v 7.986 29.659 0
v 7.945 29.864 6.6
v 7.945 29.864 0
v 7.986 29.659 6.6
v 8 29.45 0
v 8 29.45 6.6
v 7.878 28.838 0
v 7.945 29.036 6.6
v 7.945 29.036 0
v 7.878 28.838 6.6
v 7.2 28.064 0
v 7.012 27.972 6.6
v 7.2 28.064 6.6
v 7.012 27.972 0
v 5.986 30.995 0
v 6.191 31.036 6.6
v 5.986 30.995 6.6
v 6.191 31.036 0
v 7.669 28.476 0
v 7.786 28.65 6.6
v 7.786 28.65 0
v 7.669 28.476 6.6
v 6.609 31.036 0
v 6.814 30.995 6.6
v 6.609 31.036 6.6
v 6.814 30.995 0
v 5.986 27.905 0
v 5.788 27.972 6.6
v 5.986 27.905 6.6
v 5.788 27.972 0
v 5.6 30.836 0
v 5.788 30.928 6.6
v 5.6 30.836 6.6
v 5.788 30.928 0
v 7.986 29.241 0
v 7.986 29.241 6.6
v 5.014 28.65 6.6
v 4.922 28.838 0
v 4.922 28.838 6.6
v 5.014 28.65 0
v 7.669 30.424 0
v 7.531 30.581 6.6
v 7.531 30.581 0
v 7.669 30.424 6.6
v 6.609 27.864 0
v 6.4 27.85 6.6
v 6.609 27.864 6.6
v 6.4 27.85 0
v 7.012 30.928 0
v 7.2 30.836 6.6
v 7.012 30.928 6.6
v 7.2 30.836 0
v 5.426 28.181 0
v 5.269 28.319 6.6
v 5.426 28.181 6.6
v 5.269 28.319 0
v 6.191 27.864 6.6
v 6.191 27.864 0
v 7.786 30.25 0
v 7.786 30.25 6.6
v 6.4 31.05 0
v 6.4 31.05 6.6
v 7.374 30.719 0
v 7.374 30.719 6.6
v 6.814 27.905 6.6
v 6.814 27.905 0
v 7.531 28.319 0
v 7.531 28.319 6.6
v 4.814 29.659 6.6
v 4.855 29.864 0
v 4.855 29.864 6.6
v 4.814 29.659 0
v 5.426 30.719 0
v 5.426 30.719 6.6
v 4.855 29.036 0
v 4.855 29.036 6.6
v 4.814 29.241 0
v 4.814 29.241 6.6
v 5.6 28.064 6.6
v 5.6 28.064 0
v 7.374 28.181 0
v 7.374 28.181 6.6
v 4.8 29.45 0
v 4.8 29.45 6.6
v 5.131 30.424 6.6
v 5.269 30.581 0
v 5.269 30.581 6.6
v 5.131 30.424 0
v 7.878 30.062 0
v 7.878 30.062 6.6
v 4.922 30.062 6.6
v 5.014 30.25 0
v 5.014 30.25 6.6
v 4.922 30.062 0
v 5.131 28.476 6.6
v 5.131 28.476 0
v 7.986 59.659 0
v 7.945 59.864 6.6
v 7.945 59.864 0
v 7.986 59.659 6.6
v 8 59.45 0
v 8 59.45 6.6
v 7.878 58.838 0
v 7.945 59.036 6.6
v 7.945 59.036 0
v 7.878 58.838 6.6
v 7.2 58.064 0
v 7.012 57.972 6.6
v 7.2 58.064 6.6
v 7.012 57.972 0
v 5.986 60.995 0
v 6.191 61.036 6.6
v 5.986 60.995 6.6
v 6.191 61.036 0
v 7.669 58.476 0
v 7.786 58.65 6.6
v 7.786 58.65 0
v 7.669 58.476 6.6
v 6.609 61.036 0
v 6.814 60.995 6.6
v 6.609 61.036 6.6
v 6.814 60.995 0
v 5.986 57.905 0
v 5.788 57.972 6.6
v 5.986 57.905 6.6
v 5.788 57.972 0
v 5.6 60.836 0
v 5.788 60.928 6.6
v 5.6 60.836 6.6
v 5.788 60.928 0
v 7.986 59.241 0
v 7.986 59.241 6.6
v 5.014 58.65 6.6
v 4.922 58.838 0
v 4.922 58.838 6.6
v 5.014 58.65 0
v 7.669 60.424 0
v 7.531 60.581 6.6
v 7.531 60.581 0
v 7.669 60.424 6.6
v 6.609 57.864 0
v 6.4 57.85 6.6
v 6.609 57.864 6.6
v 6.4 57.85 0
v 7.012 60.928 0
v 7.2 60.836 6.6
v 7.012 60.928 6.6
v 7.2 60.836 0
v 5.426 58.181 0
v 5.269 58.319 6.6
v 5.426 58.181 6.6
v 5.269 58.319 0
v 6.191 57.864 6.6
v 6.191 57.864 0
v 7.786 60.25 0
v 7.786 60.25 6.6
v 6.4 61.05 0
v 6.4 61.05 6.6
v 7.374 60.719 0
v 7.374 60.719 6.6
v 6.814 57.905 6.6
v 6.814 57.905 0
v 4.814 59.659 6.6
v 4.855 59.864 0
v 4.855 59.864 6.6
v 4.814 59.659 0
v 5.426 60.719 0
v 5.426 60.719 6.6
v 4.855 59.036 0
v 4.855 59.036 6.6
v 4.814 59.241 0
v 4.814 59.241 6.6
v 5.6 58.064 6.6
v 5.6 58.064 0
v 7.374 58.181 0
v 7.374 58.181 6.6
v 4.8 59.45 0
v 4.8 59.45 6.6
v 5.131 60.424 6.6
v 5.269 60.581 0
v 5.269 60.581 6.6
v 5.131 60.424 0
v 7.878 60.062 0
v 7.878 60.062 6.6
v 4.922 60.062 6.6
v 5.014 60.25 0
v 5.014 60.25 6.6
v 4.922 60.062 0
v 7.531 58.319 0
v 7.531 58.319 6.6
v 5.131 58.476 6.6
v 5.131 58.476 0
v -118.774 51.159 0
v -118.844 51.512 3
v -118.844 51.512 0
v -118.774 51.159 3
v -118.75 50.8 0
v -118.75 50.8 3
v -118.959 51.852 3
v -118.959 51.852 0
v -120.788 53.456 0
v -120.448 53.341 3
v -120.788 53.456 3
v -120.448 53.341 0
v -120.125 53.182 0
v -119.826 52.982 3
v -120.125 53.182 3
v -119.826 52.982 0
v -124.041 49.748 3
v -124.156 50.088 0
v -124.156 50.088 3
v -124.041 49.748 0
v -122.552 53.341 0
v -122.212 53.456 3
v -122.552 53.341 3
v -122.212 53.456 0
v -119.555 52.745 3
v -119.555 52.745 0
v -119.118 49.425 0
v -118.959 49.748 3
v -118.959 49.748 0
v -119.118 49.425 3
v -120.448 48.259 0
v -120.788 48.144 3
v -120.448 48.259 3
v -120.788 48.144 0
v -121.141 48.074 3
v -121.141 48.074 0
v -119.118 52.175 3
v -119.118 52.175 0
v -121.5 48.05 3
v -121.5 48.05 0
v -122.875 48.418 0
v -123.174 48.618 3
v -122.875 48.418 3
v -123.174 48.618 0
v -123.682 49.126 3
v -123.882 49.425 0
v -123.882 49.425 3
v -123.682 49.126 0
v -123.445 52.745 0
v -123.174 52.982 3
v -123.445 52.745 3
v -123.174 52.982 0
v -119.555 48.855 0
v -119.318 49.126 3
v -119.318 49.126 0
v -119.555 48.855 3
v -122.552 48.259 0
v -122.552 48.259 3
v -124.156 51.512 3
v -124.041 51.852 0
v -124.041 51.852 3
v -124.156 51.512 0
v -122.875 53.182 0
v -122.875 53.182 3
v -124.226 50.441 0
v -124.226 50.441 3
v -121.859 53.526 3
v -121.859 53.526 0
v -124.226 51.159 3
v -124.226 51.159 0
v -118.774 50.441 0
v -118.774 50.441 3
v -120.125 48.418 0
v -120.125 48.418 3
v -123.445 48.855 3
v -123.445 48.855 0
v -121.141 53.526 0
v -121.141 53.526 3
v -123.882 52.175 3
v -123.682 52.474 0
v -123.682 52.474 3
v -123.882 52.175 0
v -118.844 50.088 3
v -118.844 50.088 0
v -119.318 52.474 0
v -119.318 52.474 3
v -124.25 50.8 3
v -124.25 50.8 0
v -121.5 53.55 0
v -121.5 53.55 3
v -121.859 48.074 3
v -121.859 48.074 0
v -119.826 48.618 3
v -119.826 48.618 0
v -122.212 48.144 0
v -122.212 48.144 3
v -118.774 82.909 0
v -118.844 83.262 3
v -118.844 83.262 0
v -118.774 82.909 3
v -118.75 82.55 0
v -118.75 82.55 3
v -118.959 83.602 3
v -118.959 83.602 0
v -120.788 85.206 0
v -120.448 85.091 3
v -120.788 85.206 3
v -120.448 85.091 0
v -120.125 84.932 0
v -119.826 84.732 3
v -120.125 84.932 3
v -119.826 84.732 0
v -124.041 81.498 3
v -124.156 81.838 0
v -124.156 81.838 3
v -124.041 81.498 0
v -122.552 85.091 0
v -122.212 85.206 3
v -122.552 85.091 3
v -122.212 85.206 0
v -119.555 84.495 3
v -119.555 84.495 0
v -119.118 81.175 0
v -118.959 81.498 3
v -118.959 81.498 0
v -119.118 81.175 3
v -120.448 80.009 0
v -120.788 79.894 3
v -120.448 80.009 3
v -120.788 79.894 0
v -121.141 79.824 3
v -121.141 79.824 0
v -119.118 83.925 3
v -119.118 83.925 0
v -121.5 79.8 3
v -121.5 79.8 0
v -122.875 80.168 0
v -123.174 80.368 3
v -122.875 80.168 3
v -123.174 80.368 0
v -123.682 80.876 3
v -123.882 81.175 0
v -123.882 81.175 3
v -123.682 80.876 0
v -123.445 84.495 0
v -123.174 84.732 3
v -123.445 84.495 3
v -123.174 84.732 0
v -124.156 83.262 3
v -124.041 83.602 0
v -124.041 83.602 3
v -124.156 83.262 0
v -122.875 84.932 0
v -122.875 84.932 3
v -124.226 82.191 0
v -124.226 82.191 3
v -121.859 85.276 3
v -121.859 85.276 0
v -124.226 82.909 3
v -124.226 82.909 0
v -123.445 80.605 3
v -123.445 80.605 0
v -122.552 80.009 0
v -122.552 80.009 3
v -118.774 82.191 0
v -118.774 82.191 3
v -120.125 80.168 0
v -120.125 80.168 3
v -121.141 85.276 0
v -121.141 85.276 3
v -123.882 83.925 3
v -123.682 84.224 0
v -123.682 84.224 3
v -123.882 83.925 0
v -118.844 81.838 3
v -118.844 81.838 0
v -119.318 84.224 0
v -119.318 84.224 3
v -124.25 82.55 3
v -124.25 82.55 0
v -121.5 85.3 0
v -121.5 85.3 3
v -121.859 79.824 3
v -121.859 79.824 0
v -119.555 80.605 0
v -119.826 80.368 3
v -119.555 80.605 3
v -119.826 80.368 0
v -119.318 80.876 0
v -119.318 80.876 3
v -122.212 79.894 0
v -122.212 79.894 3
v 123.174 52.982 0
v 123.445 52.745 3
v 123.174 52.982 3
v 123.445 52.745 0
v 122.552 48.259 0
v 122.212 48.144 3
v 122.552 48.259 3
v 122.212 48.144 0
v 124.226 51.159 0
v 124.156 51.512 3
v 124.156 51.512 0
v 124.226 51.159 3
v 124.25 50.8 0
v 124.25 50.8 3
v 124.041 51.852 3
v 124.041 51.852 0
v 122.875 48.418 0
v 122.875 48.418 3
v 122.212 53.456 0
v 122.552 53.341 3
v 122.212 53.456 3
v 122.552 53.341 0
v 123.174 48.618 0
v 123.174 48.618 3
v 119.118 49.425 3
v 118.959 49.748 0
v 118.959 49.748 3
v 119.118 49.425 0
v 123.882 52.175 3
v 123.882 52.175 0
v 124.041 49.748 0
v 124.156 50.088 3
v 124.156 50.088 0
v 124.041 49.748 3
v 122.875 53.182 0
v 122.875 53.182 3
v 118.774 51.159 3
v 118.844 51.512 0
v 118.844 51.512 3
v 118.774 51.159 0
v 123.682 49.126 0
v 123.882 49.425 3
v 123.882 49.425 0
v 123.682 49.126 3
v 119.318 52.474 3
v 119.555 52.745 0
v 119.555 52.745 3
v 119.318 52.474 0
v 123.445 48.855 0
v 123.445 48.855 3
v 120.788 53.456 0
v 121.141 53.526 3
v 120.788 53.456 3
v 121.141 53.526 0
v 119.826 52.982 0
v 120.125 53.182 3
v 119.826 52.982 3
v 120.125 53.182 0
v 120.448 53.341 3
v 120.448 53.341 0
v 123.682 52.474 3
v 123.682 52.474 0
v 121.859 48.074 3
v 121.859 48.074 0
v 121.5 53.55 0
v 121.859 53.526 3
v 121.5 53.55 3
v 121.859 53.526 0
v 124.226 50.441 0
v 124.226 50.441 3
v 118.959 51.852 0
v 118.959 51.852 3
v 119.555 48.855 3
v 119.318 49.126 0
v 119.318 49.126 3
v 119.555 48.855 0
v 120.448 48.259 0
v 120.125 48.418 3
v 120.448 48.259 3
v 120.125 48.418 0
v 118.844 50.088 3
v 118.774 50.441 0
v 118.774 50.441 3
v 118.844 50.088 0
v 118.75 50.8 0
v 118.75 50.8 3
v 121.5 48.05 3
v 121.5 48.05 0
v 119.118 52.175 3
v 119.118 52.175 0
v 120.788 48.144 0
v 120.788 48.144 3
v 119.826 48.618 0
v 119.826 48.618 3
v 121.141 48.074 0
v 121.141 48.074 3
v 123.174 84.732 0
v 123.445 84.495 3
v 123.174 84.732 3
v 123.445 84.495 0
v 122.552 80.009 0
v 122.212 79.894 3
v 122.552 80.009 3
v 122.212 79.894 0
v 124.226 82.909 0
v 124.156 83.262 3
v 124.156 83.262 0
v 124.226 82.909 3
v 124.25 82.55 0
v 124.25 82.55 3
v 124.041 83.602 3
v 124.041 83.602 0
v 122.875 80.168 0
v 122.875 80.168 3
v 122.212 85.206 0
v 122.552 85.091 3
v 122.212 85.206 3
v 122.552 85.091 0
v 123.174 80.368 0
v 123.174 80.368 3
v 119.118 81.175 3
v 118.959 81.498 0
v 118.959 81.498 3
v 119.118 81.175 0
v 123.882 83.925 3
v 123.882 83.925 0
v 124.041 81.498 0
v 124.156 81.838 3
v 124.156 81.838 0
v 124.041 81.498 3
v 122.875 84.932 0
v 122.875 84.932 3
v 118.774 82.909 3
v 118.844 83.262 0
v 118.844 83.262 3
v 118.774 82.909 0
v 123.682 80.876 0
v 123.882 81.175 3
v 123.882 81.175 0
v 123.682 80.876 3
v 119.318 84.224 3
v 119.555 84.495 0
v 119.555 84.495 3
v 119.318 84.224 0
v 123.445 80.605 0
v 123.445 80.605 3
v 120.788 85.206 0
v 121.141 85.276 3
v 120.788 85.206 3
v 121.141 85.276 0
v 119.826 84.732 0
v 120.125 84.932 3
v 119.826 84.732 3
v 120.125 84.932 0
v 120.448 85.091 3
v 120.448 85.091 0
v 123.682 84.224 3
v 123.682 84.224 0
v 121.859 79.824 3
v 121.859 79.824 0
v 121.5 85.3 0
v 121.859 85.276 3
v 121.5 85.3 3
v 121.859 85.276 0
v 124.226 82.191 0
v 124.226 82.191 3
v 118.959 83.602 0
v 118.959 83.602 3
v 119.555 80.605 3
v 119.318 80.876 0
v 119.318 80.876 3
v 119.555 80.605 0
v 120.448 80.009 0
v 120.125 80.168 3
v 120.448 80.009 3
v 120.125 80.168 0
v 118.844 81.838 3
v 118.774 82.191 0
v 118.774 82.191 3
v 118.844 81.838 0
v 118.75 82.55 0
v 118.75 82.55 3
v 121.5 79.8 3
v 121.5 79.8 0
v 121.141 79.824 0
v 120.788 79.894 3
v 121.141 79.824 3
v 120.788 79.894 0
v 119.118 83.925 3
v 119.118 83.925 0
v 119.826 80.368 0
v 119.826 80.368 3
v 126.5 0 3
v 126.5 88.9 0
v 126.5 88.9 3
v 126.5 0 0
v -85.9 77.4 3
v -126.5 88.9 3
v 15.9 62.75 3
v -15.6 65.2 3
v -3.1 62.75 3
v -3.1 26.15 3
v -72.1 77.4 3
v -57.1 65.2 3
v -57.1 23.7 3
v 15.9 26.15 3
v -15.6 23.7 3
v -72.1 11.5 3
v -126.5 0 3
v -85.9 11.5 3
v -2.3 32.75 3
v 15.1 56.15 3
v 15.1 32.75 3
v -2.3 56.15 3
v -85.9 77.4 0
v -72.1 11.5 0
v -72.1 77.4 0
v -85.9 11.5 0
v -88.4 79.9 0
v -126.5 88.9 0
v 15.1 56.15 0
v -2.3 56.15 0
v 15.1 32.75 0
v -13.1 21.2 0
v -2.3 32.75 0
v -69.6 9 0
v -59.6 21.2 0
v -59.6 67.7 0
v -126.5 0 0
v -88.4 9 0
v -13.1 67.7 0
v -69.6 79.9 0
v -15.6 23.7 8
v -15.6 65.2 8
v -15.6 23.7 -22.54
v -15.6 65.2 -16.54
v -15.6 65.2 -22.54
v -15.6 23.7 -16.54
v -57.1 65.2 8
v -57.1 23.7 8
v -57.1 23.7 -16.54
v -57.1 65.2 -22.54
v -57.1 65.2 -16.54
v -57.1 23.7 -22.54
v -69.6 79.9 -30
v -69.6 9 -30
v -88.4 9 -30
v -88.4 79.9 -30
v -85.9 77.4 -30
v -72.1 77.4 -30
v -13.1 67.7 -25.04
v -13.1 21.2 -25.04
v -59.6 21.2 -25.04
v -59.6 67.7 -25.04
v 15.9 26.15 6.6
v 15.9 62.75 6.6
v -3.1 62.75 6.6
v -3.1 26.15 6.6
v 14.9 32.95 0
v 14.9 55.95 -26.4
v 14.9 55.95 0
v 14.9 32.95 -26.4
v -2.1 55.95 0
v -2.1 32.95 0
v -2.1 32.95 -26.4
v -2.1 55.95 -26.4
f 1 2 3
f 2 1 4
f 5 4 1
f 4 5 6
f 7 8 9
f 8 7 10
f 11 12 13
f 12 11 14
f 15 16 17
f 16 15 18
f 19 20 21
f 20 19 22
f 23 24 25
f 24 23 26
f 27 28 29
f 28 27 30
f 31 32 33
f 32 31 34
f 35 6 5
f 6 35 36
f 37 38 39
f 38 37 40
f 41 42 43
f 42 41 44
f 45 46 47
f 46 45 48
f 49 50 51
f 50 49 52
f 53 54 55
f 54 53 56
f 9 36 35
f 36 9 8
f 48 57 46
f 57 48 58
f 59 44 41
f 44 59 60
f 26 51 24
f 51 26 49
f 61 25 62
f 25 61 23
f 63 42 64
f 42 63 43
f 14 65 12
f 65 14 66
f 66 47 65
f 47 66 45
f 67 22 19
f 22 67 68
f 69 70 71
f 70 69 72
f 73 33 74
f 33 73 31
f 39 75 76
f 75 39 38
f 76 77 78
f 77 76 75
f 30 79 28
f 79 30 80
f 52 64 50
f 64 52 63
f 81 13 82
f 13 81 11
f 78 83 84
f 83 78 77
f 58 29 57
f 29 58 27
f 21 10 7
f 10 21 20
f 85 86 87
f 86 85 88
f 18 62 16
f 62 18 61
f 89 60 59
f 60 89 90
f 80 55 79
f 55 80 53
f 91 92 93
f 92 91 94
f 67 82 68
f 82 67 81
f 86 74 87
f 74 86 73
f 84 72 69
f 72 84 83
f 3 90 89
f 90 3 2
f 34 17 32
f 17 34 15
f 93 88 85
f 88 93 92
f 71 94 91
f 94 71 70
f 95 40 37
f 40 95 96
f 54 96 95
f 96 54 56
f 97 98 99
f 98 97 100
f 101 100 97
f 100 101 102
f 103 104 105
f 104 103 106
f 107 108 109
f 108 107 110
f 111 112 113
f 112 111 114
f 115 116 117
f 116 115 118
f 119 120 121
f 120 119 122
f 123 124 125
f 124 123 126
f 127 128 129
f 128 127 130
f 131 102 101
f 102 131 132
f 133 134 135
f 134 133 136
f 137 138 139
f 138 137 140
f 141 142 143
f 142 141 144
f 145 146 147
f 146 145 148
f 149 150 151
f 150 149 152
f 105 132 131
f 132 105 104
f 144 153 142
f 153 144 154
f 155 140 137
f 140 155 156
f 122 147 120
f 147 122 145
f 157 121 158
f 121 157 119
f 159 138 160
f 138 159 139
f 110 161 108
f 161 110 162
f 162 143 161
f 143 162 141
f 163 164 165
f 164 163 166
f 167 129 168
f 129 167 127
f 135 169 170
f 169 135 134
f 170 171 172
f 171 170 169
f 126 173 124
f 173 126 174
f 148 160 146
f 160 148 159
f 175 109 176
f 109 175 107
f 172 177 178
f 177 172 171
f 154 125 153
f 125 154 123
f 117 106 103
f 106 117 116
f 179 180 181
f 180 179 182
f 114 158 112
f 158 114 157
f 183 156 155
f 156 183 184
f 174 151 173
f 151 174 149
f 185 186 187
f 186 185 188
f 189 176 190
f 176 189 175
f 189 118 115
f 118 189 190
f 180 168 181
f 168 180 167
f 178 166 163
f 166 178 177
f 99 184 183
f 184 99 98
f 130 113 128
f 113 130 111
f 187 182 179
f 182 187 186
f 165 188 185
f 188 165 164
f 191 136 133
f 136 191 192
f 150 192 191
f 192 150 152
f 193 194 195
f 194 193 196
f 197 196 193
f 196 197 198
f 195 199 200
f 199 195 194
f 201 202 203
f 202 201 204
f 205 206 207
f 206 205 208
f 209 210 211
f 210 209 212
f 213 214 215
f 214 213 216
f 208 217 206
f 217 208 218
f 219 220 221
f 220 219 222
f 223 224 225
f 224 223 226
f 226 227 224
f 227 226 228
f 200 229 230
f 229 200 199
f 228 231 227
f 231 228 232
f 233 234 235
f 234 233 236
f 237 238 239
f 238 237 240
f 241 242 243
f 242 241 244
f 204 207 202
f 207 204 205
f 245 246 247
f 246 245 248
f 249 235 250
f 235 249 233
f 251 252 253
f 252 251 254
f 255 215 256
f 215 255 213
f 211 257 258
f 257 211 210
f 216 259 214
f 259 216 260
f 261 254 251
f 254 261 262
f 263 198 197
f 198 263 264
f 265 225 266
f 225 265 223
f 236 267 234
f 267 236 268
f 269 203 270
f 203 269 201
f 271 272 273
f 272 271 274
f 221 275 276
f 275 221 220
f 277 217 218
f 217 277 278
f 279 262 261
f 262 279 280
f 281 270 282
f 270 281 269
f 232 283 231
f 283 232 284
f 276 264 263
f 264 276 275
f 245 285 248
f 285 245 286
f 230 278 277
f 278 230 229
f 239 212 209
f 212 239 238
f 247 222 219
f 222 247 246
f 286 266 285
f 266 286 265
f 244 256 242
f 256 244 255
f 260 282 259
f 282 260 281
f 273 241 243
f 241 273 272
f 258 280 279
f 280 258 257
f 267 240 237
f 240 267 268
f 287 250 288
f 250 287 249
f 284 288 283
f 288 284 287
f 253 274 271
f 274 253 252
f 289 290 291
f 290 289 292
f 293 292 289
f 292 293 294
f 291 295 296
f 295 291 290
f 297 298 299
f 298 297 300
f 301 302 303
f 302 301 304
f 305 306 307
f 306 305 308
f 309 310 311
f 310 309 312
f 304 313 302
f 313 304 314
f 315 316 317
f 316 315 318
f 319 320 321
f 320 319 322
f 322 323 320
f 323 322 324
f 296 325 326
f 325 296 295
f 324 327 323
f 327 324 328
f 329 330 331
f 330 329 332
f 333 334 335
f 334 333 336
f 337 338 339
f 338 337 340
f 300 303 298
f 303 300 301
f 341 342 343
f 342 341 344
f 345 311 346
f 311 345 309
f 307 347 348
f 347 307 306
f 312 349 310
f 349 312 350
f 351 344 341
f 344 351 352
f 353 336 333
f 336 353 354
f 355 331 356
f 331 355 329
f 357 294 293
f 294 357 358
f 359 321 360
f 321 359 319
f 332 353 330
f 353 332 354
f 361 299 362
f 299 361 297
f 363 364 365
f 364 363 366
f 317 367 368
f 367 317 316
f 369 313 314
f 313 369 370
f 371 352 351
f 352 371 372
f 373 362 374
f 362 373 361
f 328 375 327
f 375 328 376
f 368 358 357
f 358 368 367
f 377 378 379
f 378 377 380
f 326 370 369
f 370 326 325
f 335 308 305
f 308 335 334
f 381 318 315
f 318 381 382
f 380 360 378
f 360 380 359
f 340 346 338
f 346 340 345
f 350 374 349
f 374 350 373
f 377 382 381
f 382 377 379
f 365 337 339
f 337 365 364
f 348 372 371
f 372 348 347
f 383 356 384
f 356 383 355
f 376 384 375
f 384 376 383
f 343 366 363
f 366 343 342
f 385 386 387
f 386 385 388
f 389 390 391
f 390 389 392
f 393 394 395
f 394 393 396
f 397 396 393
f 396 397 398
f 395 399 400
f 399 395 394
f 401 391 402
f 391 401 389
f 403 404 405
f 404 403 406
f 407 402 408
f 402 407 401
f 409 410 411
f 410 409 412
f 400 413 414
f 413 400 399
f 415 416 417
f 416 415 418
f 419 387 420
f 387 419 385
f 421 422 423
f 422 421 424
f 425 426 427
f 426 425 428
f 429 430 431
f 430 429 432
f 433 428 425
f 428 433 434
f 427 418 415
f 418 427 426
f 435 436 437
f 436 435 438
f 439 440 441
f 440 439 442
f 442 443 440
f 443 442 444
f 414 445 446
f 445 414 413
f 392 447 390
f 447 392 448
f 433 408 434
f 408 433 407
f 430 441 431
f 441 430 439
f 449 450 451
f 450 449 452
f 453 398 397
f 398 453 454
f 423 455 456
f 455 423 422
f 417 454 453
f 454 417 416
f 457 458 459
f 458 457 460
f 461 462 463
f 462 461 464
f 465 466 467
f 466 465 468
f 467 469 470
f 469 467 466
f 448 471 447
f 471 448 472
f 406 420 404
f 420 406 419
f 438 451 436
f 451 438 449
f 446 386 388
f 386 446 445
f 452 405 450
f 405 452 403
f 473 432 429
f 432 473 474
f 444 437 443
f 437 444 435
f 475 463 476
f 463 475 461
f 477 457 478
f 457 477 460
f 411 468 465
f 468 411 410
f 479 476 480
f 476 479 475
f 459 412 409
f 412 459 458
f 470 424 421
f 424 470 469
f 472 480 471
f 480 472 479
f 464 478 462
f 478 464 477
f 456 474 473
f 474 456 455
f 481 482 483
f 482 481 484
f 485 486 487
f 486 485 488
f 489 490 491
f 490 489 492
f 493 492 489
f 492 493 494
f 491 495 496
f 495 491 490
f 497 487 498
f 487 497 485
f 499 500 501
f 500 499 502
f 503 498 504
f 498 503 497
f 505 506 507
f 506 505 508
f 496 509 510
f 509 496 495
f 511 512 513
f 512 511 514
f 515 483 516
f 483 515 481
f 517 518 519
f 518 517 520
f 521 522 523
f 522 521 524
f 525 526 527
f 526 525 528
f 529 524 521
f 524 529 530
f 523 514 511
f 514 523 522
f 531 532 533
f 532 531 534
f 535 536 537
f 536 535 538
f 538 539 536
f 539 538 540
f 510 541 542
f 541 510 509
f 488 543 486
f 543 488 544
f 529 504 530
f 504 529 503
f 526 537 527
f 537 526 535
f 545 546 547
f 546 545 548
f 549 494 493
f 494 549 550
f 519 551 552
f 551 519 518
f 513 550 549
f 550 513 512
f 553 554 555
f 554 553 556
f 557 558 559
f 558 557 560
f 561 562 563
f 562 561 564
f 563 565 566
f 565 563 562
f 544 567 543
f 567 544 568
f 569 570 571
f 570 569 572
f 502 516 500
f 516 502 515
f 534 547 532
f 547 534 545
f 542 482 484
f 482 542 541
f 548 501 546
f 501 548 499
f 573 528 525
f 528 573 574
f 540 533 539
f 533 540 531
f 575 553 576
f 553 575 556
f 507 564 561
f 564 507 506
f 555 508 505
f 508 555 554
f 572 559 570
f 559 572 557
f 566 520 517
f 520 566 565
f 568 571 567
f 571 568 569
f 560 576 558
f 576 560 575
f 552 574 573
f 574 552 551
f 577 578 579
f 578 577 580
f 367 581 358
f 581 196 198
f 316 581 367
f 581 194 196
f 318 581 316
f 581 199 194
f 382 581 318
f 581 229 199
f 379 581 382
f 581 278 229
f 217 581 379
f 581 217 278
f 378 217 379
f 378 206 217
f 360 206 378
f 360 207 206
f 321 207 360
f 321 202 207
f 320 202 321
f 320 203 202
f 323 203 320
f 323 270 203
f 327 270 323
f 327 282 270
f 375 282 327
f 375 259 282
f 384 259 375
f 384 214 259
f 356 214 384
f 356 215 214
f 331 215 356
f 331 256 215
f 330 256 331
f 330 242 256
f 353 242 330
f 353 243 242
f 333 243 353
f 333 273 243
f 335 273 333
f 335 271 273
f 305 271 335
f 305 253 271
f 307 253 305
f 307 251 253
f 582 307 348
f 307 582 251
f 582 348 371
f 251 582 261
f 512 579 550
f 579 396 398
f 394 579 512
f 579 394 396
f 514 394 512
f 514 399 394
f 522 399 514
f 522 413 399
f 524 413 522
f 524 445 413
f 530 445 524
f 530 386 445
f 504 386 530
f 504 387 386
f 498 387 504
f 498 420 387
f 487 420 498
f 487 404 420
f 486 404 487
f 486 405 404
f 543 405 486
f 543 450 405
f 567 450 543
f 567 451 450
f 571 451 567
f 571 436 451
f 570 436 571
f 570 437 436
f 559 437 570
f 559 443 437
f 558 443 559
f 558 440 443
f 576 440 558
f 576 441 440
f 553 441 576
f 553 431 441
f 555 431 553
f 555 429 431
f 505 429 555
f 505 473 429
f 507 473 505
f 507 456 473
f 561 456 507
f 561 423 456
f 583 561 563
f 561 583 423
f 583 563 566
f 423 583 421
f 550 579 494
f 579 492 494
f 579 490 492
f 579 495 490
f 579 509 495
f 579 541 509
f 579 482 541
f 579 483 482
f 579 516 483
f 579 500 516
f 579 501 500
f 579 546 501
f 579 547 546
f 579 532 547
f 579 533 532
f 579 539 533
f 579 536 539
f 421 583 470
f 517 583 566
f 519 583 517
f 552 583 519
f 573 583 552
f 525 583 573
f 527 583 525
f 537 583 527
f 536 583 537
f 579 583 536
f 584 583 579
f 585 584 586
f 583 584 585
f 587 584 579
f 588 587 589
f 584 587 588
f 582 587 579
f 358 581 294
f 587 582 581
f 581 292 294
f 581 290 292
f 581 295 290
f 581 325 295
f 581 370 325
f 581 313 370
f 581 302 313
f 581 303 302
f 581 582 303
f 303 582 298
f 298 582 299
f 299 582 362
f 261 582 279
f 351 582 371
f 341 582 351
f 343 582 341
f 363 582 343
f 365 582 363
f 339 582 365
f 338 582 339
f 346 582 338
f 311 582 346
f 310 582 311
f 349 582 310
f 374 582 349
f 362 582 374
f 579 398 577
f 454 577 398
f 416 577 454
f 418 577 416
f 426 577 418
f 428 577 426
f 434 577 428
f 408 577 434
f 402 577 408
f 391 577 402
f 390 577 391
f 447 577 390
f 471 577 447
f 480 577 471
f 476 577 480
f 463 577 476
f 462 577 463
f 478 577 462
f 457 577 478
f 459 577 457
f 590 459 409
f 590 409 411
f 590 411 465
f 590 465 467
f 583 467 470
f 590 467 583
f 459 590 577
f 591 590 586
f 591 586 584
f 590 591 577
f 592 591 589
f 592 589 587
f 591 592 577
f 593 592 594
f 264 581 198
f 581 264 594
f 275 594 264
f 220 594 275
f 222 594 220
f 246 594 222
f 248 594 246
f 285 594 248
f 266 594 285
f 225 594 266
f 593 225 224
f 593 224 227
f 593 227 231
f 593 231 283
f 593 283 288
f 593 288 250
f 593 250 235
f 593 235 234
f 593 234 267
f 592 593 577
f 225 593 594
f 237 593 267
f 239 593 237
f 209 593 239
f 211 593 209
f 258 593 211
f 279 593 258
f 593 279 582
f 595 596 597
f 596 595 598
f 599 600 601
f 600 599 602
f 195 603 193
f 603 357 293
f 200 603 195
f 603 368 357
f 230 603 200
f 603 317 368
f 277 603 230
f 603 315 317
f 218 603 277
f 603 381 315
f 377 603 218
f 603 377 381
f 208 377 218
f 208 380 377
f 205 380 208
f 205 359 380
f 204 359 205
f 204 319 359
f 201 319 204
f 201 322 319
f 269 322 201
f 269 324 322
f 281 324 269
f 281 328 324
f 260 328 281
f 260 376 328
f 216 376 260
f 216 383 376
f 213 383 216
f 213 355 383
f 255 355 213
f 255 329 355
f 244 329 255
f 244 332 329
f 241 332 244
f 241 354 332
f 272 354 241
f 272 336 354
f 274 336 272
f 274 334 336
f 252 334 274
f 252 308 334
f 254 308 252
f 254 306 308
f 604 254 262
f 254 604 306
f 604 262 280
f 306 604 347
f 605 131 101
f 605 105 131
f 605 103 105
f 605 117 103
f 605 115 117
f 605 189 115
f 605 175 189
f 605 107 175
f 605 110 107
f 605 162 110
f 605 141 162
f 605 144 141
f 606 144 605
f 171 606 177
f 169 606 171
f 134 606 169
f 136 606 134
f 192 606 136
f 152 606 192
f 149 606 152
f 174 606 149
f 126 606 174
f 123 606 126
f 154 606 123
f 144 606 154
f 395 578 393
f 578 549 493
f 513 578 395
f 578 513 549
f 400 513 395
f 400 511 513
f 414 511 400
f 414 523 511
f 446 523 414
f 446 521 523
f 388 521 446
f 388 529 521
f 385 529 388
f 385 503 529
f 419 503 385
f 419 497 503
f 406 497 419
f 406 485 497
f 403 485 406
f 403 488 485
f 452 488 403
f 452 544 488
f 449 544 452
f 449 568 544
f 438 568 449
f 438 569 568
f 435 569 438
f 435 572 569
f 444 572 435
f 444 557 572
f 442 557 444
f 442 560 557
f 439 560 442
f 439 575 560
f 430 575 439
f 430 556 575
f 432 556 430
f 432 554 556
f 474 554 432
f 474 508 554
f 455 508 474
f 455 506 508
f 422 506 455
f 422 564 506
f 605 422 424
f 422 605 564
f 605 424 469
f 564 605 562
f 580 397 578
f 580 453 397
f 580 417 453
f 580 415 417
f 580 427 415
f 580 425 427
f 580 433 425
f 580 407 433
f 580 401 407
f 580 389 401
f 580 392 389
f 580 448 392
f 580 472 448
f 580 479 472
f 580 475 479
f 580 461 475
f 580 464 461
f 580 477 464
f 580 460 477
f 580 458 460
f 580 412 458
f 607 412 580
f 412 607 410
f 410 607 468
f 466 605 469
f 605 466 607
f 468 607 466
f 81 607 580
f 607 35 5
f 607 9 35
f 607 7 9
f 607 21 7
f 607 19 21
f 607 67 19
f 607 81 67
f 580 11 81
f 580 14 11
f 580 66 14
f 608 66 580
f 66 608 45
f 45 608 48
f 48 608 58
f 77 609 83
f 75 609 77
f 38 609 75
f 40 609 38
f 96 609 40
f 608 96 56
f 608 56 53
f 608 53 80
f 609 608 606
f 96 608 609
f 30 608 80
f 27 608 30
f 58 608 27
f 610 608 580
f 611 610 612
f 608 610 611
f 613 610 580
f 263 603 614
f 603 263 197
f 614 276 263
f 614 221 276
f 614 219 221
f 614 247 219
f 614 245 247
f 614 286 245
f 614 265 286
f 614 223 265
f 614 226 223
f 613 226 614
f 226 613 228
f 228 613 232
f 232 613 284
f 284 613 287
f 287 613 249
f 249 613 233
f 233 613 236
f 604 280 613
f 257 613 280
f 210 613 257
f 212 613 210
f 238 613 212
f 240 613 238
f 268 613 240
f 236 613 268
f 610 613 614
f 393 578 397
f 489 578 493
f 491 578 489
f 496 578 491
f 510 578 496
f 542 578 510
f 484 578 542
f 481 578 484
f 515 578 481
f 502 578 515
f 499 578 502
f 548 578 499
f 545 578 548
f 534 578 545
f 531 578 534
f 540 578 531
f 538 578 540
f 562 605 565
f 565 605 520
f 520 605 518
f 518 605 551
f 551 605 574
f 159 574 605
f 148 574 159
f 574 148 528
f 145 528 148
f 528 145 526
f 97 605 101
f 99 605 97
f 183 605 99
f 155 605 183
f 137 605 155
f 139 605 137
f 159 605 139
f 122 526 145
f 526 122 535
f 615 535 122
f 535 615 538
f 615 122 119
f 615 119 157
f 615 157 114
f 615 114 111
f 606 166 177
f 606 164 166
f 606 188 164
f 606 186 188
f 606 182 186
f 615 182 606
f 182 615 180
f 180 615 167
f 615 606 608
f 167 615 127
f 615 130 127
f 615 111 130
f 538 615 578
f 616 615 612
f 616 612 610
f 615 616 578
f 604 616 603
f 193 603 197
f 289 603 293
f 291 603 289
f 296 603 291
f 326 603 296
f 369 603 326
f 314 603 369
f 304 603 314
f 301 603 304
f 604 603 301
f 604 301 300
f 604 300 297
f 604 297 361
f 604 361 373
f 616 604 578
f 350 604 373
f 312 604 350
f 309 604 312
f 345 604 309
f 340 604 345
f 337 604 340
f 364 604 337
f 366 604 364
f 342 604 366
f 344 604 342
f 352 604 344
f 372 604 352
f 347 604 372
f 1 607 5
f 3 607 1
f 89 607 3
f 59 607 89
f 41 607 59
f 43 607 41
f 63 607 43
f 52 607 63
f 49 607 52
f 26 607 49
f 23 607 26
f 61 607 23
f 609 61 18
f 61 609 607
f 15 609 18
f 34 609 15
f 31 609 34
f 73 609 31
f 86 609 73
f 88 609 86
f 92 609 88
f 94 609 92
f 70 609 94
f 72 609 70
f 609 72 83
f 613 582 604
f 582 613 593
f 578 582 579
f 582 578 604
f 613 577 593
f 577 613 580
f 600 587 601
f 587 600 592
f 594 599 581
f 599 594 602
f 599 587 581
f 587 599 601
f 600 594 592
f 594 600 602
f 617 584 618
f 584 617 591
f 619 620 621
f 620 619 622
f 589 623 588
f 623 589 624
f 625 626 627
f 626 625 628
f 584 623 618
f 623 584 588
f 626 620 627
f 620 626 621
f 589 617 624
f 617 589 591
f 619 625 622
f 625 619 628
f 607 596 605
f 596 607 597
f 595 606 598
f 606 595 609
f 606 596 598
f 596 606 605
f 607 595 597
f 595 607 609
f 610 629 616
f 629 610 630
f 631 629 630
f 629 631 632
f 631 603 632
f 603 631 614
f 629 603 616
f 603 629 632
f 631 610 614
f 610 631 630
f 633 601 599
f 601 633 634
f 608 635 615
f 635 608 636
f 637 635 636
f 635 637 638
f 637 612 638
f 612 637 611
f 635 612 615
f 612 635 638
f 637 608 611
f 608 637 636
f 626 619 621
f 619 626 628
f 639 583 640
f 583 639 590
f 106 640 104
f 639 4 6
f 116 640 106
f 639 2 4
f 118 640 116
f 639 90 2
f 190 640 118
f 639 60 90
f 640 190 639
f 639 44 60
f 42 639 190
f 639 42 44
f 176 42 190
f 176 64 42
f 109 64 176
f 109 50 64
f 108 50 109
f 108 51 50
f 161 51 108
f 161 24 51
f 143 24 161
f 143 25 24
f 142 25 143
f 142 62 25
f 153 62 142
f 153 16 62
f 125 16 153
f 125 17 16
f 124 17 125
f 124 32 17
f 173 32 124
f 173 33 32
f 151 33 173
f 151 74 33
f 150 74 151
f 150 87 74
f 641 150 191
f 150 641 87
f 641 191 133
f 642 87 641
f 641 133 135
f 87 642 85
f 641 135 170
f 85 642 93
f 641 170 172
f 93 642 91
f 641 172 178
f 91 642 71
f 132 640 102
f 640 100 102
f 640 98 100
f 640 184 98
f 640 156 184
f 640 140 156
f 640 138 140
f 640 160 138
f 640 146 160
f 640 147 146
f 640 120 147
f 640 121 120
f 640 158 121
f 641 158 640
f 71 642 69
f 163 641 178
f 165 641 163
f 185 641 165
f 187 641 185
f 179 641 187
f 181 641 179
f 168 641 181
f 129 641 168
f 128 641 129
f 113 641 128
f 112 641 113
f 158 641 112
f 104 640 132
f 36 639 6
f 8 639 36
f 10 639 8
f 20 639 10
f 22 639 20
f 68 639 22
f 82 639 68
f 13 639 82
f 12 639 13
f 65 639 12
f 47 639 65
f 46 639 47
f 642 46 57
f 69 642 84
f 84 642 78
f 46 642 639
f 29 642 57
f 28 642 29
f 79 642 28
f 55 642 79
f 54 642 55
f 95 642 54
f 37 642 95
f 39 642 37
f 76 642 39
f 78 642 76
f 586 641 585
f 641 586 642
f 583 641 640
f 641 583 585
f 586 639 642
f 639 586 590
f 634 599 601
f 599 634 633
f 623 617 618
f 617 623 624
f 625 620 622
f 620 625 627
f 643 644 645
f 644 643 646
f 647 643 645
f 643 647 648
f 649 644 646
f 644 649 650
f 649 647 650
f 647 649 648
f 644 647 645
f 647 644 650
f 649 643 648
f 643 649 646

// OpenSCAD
// =============================================================================
// CONSOLE10 — Aux Faceplate  v0.1  (2U: CF reader + SD holder + USB-C)
//
// Regular 2U flat 3 mm faceplate that bolts to the cheek SLANT inserts.
// Hosts three devices left-to-right: CF reader, SD-card holder, USB-C panel
// mount.
//
// Split off from the 3U LCD-hole faceplate on 2026-05-30. See
// `Console10_interface_specs.md` for the canonical device dimensions.
// =============================================================================

// ---------- module geometry the plate must mate to ----------
panel_width   = 253;
cheek_thick   = 10;
slant_angle   = 30;
U             = 44.45;
interior_half = panel_width/2 - cheek_thick;   // 116.5
cheek_ctr_x   = interior_half + cheek_thick/2; // 121.5

// ---------- flat plate ----------
n_u      = 2;             // 2U faceplate
plate_w  = 253;
plate_h  = n_u * U;       // 88.9
plate_t  = 3;

// ---------- CF reader (press-fit, full-depth open sleeve) ----------
cf_w         = 13.8;
cf_h         = 65.9;
cf_d         = 30;
cf_press_clr = 0;
cf_wall_t    = 2.5;
cf_cx        = -79;
cf_cy        = plate_h/2;

// ---------- SD card holder (press-fit, closed-back sleeve, sits proud) ----
holder_w         = 41.5;
holder_h         = 41.5;
holder_d         = 24.54;
holder_press_clr = 0;
holder_wall_t    = 2.5;
holder_proud     = 5;
holder_sleeve_extra_d = 6;
holder_sleeve_d  = (holder_d - plate_t - holder_proud) + holder_wall_t + holder_sleeve_extra_d;

// ---------- USB-C panel mount (QIANRENON rectangular, screw-mounted, proud) ----
usbc_body_w         = 17;
usbc_body_h         = 23;
usbc_body_d         = 26.4;
usbc_flange_w       = 19;
usbc_flange_h       = 36.6;
usbc_flange_t       = 3.6;
usbc_screw_d        = 3.2;
usbc_screw_y_pitch  = 30;
usbc_body_clr       = 0.2;

// ---------- horizontal layout ----------
panel_layout_gap = 10;
holder_cx = cf_cx + (cf_w - 2*cf_press_clr)/2 + cf_wall_t + panel_layout_gap
                  + (holder_w - 2*holder_press_clr)/2 + holder_wall_t;
holder_cy = plate_h/2;

usbc_cx = holder_cx + (holder_w - 2*holder_press_clr)/2 + holder_wall_t
                    + panel_layout_gap + usbc_flange_w/2;
usbc_cy = plate_h/2;

// ---------- slant-insert mount holes ----------
// 2U plate: only U0-row cheek holes fit (50.80, 66.675, 82.55).
// Wide pair = 50.80 + 82.55 → 31.75 mm vertical grip.
mount_y      = [50.80, 82.55];
m10_32_clear = 5.5;

show_on_slant = false;
show_devices  = true;
floor_t       = 6;

$fn = 48;

echo(str("AUX FACEPLATE v0.1 (2U: CF + holder + USB-C) ", plate_w, " x ", plate_h, " (", n_u, "U) t", plate_t,
         " | CF @ x=", cf_cx,
         " | HOLDER @ x=", holder_cx, " sleeve d=", holder_sleeve_d, " proud ", holder_proud,
         " | USB-C @ x=", usbc_cx, " (cutout ", usbc_body_w + 2*usbc_body_clr, "x", usbc_body_h + 2*usbc_body_clr,
         ", screws Φ", usbc_screw_d, " @ y±", usbc_screw_y_pitch/2, ")"));

// =============================================================================
// CF SUPPORT SLEEVE — open both ends, wraps the CF reader full depth.
// =============================================================================
module cf_support_sleeve() {
    inner_w  = cf_w - 2*cf_press_clr;
    inner_h  = cf_h - 2*cf_press_clr;
    outer_w  = inner_w + 2*cf_wall_t;
    outer_h  = inner_h + 2*cf_wall_t;
    translate([cf_cx, cf_cy, -cf_d/2])
        difference() {
            cube([outer_w, outer_h, cf_d],     center = true);
            cube([inner_w, inner_h, cf_d + 2], center = true);
        }
}

// =============================================================================
// HOLDER SUPPORT SLEEVE — closed back (floor is the bottom-out stop).
// =============================================================================
module holder_support_sleeve() {
    inner_w   = holder_w - 2*holder_press_clr;
    inner_h   = holder_h - 2*holder_press_clr;
    outer_w   = inner_w + 2*holder_wall_t;
    outer_h   = inner_h + 2*holder_wall_t;
    cavity_d  = holder_sleeve_d - holder_wall_t;

    difference() {
        translate([holder_cx - outer_w/2, holder_cy - outer_h/2, -holder_sleeve_d])
            cube([outer_w, outer_h, holder_sleeve_d]);
        translate([holder_cx - inner_w/2, holder_cy - inner_h/2, -cavity_d])
            cube([inner_w, inner_h, cavity_d + 1]);
    }
}

// =============================================================================
// PANEL — flat 2U 3 mm slab + cutouts + rear sleeves.
// =============================================================================
module panel() {
    union() {
        difference() {
            translate([-plate_w/2, 0, 0]) cube([plate_w, plate_h, plate_t]);

            // CF reader press-fit cutout
            translate([cf_cx, cf_cy, plate_t/2])
                cube([cf_w - 2*cf_press_clr, cf_h - 2*cf_press_clr, plate_t + 2], center = true);

            // SD card holder press-fit cutout
            translate([holder_cx, holder_cy, plate_t/2])
                cube([holder_w - 2*holder_press_clr, holder_h - 2*holder_press_clr, plate_t + 2], center = true);

            // USB-C panel-mount: body cutout + 2 M3 screw holes
            translate([usbc_cx, usbc_cy, plate_t/2])
                cube([usbc_body_w + 2*usbc_body_clr, usbc_body_h + 2*usbc_body_clr, plate_t + 2], center = true);
            for (dy = [-1, 1])
                translate([usbc_cx, usbc_cy + dy*usbc_screw_y_pitch/2, -1])
                    cylinder(d = usbc_screw_d, h = plate_t + 2);

            // Slant-insert mount screws — 2 per side
            for (sx = [-cheek_ctr_x, cheek_ctr_x])
                for (y = mount_y)
                    translate([sx, y, -1]) cylinder(d = m10_32_clear, h = plate_t + 2);
        }

        cf_support_sleeve();
        holder_support_sleeve();
    }
}

// =============================================================================
// MOCKS — fit-check only.
// =============================================================================
module device_mocks() {
    color("SlateGray")
        translate([cf_cx, cf_cy, -cf_d/2])
            cube([cf_w, cf_h, cf_d], center = true);

    color("Goldenrod")
        translate([holder_cx, holder_cy, plate_t + holder_proud - holder_d/2])
            cube([holder_w, holder_h, holder_d], center = true);

    color("Silver")
        difference() {
            translate([usbc_cx, usbc_cy, plate_t + usbc_flange_t/2])
                cube([usbc_flange_w, usbc_flange_h, usbc_flange_t], center = true);
            for (dy = [-1, 1])
                translate([usbc_cx, usbc_cy + dy*usbc_screw_y_pitch/2, plate_t - 1])
                    cylinder(d = usbc_screw_d, h = usbc_flange_t + 2);
        }
    color("DimGray")
        translate([usbc_cx, usbc_cy, -usbc_body_d/2])
            cube([usbc_body_w, usbc_body_h, usbc_body_d], center = true);
}

module aux_stack() {
    color("Gainsboro") panel();
    if (show_devices) device_mocks();
}

module aux_on_slant() {
    translate([0, 0, floor_t])
        rotate([90 - slant_angle, 0, 0])
            aux_stack();
}

// Public entry the module assembly calls:
module aux_2u_faceplate_on_slant() { aux_on_slant(); }

if (show_on_slant) aux_on_slant();
else               aux_stack();
